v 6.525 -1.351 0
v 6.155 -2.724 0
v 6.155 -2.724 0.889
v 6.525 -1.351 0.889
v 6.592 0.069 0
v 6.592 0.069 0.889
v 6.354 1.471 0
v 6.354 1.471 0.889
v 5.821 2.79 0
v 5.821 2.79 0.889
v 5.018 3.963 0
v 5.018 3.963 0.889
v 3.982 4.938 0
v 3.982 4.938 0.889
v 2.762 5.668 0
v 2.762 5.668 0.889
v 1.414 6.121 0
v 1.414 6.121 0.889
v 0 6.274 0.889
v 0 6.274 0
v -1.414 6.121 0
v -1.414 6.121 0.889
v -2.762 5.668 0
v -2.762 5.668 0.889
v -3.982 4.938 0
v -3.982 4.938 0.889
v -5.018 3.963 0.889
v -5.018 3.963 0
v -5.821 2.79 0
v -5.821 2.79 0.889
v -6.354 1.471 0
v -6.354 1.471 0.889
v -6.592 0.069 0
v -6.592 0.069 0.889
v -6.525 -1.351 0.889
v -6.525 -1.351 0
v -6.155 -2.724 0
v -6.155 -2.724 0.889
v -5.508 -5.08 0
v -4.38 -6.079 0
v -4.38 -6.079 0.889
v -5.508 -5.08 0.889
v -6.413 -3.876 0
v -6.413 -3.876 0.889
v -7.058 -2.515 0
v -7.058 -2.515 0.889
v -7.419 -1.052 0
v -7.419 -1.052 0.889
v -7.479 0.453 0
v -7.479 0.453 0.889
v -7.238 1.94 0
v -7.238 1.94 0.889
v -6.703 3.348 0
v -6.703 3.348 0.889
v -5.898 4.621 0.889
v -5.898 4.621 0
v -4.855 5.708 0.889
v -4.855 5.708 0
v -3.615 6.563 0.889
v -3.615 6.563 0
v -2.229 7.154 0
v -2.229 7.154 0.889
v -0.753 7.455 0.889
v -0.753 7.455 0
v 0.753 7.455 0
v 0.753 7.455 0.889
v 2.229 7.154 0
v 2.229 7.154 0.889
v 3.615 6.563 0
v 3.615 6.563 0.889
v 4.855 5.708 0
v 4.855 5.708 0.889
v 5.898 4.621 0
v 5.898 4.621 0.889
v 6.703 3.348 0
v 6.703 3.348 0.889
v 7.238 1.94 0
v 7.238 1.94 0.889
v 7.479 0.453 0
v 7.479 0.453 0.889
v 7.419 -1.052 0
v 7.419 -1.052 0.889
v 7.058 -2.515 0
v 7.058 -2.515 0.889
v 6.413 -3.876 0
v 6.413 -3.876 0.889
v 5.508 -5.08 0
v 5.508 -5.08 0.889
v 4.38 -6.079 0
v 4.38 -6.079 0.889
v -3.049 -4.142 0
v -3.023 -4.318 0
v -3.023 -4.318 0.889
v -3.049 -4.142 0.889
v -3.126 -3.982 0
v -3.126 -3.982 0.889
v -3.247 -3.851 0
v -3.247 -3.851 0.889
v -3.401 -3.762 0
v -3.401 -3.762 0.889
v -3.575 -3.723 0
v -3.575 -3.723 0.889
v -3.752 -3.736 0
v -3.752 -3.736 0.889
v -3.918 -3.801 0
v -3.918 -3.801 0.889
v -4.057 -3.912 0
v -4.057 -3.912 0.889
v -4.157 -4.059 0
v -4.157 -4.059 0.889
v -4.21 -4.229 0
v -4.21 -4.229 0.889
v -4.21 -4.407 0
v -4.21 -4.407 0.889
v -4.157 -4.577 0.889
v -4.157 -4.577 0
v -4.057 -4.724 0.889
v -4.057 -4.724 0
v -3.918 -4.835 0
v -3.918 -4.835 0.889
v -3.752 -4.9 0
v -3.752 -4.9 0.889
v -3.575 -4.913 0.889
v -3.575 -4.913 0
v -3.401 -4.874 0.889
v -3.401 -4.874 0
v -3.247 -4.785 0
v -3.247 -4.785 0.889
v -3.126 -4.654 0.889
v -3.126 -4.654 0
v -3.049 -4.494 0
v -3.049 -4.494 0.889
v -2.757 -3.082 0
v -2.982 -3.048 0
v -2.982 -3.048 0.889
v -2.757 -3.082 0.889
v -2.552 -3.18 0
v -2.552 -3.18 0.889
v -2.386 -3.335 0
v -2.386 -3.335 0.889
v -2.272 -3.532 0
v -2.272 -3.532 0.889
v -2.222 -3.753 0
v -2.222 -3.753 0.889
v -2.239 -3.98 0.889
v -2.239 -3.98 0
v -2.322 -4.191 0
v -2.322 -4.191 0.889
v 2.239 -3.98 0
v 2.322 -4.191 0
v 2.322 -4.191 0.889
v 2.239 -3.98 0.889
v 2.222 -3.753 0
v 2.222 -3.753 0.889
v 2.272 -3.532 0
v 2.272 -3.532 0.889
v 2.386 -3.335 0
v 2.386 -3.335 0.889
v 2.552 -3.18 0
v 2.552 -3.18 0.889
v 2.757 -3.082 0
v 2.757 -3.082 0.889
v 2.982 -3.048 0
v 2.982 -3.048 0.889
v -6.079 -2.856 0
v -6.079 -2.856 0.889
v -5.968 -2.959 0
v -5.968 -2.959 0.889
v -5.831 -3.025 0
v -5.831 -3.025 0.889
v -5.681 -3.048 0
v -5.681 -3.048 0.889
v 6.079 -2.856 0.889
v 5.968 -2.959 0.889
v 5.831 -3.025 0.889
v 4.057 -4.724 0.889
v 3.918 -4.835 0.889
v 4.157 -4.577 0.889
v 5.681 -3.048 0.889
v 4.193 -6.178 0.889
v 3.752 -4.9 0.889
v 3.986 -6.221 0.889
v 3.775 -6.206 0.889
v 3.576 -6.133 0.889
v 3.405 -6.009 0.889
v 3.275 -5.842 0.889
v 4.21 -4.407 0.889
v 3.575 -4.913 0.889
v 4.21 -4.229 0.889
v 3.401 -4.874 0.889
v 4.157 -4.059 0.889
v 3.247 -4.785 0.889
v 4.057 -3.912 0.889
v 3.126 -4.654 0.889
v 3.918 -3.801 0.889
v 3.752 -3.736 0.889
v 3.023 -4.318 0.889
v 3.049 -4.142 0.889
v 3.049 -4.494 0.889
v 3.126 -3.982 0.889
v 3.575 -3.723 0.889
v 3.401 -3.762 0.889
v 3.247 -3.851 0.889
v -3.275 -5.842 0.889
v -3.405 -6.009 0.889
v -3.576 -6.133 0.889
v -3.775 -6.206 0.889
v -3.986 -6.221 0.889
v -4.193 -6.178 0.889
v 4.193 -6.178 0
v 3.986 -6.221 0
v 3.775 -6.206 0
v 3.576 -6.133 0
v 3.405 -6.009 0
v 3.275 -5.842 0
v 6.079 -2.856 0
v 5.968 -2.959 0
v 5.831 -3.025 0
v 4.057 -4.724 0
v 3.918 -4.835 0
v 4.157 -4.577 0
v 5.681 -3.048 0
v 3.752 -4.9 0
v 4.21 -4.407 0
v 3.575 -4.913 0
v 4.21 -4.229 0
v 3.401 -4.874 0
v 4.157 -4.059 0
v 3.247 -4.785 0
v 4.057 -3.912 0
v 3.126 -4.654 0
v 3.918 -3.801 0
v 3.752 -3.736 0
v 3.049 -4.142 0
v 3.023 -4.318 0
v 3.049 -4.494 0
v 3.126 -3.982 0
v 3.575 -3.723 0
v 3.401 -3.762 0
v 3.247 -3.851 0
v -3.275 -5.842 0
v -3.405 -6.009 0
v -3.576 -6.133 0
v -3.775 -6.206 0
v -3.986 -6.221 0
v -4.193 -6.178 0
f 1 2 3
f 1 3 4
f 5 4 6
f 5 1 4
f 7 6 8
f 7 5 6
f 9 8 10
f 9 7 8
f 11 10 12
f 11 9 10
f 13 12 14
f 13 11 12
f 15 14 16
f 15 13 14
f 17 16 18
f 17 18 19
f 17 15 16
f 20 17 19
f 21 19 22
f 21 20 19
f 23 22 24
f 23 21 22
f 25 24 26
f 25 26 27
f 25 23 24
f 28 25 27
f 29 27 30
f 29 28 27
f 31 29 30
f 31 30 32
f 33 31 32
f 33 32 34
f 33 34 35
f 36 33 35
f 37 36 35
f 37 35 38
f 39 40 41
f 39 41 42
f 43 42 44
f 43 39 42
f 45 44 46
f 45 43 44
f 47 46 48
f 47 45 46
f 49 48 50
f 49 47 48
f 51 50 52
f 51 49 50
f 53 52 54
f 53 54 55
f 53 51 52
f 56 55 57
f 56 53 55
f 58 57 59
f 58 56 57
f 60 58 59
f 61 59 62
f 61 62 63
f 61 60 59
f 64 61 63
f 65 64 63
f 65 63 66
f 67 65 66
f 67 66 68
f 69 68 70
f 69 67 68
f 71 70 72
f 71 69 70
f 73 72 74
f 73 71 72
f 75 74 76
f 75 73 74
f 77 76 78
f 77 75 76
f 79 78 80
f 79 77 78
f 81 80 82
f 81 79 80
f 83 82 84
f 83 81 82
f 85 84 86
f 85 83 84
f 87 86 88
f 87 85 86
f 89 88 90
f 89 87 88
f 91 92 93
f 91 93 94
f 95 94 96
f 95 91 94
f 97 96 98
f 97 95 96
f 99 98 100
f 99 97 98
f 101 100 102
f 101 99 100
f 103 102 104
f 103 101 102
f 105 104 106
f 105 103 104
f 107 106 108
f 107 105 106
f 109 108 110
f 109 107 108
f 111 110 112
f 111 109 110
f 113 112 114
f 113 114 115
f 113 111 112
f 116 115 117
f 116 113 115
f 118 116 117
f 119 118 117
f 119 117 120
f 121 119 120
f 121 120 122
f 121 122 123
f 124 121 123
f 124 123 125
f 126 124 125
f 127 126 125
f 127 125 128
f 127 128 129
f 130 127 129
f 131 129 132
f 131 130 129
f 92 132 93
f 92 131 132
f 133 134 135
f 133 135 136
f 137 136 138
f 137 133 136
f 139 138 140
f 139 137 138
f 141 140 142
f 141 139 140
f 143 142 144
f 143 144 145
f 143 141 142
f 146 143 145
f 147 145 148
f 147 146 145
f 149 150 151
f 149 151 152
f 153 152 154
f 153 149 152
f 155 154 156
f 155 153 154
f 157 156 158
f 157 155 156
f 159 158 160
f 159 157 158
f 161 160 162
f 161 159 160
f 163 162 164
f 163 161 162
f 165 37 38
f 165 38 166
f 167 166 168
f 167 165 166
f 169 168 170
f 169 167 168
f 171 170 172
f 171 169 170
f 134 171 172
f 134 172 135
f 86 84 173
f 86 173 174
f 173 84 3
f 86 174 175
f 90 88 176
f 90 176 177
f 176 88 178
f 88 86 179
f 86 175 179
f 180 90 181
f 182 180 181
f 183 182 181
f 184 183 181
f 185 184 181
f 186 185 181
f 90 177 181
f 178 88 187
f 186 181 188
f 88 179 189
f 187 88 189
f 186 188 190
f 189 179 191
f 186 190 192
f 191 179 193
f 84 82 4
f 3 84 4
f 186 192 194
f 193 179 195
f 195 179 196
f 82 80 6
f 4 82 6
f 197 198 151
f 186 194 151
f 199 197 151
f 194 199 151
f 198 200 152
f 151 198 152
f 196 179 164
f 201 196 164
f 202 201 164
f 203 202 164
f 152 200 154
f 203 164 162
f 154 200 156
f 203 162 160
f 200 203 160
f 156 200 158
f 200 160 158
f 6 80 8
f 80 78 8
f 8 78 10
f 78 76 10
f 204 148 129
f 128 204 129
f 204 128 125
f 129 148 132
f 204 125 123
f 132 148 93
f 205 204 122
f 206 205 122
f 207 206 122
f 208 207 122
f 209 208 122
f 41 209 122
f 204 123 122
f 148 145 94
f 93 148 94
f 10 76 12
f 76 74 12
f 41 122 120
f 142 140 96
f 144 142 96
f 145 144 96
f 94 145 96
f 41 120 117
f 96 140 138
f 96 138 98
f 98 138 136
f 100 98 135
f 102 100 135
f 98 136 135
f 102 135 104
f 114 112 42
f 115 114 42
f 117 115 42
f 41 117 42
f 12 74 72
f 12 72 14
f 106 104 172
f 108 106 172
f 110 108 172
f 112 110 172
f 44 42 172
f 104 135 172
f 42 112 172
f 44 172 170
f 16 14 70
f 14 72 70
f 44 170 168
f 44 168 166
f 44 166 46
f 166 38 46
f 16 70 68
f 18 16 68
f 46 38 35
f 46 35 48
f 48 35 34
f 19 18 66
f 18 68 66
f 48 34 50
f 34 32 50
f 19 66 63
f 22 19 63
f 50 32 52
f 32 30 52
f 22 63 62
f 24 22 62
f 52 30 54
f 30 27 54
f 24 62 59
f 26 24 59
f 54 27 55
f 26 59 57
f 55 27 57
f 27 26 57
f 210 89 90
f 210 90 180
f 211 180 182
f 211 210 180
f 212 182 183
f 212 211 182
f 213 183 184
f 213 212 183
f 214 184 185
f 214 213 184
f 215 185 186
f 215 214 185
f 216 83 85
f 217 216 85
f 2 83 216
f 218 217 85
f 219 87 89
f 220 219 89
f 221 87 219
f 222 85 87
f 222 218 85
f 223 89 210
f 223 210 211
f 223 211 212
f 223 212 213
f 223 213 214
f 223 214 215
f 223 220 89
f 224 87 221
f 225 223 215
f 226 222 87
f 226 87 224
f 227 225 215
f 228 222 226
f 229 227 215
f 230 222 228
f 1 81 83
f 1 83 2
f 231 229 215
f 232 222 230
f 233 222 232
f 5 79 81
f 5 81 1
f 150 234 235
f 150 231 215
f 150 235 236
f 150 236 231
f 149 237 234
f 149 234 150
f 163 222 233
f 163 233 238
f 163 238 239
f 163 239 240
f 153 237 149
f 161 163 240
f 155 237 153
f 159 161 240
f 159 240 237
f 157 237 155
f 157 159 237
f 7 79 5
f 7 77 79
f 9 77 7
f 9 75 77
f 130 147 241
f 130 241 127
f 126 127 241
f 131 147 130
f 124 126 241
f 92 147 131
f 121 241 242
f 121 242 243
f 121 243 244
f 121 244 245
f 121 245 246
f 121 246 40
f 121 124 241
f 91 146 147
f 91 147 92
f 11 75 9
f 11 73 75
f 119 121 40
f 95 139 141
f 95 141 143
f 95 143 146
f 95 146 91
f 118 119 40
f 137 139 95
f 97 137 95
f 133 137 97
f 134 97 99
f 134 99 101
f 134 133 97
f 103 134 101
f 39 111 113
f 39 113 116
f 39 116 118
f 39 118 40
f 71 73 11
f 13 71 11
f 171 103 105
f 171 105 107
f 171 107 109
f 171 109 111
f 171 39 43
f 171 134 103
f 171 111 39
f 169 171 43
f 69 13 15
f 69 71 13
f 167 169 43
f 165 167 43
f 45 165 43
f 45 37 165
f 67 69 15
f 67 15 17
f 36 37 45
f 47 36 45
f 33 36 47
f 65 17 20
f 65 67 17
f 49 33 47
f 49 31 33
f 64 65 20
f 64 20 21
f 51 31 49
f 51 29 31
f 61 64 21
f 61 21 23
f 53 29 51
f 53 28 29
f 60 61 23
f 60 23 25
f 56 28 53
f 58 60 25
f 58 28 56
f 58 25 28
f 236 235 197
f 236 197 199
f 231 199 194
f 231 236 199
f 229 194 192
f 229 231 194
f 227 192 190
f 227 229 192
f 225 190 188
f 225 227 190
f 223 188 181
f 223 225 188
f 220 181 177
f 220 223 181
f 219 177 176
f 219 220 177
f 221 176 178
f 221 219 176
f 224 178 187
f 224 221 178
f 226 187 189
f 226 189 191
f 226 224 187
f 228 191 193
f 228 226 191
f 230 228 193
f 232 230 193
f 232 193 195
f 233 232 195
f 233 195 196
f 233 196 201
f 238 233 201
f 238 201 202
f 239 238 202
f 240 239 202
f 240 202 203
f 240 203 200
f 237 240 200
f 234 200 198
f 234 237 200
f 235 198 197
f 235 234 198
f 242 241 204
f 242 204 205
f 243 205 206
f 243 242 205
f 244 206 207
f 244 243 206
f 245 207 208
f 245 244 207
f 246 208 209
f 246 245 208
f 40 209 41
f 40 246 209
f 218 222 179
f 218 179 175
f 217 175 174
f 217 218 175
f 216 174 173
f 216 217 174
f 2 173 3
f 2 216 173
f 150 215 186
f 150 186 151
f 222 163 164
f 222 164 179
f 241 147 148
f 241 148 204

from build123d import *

# Parameters (mm, degrees)
SKETCH1_R           = 0.5969
BOSS_EXTRUDE1_DEPTH = 0.889


with BuildPart() as part:
    # Sketch1 → Boss-Extrude1 (new body)
    with BuildSketch(Plane.XY):
        with BuildLine():
            Line((-5.68137307, -3.048), (-2.981745785, -3.048))
            ThreePointArc((-2.981745785, -3.048), (-2.321834428, -3.429), (-2.321834428, -4.191))
            Line((-2.321834428, -4.191), (-3.275039722, -5.842))
            ThreePointArc((-3.275039722, -5.842), (-3.775058057, -6.206035718), (-4.38041724, -6.079226415))
            ThreePointArc((-4.38041724, -6.079226415), (0, 7.493), (4.38041724, -6.079226415))
            ThreePointArc((4.38041724, -6.079226415), (3.775058057, -6.206035718), (3.275039722, -5.842))
            Line((3.275039722, -5.842), (2.321834428, -4.191))
            ThreePointArc((2.321834428, -4.191), (2.321834428, -3.429), (2.981745785, -3.048))
            Line((2.981745785, -3.048), (5.68137307, -3.048))
            ThreePointArc((5.68137307, -3.048), (5.968179451, -2.95929238), (6.154820826, -2.72415))
            ThreePointArc((6.154820826, -2.72415), (0, 6.2738), (-6.154820826, -2.72415))
            ThreePointArc((-6.154820826, -2.72415), (-5.968179451, -2.95929238), (-5.68137307, -3.048))
        make_face()
        with Locations((-3.6195, -4.318)):
            Circle(SKETCH1_R, mode=Mode.SUBTRACT)
        with Locations(Location((3.6195, -4.318, 0), (0, 0, 180))):
            Circle(SKETCH1_R, mode=Mode.SUBTRACT)
    extrude(amount=BOSS_EXTRUDE1_DEPTH)


solid = part.part
